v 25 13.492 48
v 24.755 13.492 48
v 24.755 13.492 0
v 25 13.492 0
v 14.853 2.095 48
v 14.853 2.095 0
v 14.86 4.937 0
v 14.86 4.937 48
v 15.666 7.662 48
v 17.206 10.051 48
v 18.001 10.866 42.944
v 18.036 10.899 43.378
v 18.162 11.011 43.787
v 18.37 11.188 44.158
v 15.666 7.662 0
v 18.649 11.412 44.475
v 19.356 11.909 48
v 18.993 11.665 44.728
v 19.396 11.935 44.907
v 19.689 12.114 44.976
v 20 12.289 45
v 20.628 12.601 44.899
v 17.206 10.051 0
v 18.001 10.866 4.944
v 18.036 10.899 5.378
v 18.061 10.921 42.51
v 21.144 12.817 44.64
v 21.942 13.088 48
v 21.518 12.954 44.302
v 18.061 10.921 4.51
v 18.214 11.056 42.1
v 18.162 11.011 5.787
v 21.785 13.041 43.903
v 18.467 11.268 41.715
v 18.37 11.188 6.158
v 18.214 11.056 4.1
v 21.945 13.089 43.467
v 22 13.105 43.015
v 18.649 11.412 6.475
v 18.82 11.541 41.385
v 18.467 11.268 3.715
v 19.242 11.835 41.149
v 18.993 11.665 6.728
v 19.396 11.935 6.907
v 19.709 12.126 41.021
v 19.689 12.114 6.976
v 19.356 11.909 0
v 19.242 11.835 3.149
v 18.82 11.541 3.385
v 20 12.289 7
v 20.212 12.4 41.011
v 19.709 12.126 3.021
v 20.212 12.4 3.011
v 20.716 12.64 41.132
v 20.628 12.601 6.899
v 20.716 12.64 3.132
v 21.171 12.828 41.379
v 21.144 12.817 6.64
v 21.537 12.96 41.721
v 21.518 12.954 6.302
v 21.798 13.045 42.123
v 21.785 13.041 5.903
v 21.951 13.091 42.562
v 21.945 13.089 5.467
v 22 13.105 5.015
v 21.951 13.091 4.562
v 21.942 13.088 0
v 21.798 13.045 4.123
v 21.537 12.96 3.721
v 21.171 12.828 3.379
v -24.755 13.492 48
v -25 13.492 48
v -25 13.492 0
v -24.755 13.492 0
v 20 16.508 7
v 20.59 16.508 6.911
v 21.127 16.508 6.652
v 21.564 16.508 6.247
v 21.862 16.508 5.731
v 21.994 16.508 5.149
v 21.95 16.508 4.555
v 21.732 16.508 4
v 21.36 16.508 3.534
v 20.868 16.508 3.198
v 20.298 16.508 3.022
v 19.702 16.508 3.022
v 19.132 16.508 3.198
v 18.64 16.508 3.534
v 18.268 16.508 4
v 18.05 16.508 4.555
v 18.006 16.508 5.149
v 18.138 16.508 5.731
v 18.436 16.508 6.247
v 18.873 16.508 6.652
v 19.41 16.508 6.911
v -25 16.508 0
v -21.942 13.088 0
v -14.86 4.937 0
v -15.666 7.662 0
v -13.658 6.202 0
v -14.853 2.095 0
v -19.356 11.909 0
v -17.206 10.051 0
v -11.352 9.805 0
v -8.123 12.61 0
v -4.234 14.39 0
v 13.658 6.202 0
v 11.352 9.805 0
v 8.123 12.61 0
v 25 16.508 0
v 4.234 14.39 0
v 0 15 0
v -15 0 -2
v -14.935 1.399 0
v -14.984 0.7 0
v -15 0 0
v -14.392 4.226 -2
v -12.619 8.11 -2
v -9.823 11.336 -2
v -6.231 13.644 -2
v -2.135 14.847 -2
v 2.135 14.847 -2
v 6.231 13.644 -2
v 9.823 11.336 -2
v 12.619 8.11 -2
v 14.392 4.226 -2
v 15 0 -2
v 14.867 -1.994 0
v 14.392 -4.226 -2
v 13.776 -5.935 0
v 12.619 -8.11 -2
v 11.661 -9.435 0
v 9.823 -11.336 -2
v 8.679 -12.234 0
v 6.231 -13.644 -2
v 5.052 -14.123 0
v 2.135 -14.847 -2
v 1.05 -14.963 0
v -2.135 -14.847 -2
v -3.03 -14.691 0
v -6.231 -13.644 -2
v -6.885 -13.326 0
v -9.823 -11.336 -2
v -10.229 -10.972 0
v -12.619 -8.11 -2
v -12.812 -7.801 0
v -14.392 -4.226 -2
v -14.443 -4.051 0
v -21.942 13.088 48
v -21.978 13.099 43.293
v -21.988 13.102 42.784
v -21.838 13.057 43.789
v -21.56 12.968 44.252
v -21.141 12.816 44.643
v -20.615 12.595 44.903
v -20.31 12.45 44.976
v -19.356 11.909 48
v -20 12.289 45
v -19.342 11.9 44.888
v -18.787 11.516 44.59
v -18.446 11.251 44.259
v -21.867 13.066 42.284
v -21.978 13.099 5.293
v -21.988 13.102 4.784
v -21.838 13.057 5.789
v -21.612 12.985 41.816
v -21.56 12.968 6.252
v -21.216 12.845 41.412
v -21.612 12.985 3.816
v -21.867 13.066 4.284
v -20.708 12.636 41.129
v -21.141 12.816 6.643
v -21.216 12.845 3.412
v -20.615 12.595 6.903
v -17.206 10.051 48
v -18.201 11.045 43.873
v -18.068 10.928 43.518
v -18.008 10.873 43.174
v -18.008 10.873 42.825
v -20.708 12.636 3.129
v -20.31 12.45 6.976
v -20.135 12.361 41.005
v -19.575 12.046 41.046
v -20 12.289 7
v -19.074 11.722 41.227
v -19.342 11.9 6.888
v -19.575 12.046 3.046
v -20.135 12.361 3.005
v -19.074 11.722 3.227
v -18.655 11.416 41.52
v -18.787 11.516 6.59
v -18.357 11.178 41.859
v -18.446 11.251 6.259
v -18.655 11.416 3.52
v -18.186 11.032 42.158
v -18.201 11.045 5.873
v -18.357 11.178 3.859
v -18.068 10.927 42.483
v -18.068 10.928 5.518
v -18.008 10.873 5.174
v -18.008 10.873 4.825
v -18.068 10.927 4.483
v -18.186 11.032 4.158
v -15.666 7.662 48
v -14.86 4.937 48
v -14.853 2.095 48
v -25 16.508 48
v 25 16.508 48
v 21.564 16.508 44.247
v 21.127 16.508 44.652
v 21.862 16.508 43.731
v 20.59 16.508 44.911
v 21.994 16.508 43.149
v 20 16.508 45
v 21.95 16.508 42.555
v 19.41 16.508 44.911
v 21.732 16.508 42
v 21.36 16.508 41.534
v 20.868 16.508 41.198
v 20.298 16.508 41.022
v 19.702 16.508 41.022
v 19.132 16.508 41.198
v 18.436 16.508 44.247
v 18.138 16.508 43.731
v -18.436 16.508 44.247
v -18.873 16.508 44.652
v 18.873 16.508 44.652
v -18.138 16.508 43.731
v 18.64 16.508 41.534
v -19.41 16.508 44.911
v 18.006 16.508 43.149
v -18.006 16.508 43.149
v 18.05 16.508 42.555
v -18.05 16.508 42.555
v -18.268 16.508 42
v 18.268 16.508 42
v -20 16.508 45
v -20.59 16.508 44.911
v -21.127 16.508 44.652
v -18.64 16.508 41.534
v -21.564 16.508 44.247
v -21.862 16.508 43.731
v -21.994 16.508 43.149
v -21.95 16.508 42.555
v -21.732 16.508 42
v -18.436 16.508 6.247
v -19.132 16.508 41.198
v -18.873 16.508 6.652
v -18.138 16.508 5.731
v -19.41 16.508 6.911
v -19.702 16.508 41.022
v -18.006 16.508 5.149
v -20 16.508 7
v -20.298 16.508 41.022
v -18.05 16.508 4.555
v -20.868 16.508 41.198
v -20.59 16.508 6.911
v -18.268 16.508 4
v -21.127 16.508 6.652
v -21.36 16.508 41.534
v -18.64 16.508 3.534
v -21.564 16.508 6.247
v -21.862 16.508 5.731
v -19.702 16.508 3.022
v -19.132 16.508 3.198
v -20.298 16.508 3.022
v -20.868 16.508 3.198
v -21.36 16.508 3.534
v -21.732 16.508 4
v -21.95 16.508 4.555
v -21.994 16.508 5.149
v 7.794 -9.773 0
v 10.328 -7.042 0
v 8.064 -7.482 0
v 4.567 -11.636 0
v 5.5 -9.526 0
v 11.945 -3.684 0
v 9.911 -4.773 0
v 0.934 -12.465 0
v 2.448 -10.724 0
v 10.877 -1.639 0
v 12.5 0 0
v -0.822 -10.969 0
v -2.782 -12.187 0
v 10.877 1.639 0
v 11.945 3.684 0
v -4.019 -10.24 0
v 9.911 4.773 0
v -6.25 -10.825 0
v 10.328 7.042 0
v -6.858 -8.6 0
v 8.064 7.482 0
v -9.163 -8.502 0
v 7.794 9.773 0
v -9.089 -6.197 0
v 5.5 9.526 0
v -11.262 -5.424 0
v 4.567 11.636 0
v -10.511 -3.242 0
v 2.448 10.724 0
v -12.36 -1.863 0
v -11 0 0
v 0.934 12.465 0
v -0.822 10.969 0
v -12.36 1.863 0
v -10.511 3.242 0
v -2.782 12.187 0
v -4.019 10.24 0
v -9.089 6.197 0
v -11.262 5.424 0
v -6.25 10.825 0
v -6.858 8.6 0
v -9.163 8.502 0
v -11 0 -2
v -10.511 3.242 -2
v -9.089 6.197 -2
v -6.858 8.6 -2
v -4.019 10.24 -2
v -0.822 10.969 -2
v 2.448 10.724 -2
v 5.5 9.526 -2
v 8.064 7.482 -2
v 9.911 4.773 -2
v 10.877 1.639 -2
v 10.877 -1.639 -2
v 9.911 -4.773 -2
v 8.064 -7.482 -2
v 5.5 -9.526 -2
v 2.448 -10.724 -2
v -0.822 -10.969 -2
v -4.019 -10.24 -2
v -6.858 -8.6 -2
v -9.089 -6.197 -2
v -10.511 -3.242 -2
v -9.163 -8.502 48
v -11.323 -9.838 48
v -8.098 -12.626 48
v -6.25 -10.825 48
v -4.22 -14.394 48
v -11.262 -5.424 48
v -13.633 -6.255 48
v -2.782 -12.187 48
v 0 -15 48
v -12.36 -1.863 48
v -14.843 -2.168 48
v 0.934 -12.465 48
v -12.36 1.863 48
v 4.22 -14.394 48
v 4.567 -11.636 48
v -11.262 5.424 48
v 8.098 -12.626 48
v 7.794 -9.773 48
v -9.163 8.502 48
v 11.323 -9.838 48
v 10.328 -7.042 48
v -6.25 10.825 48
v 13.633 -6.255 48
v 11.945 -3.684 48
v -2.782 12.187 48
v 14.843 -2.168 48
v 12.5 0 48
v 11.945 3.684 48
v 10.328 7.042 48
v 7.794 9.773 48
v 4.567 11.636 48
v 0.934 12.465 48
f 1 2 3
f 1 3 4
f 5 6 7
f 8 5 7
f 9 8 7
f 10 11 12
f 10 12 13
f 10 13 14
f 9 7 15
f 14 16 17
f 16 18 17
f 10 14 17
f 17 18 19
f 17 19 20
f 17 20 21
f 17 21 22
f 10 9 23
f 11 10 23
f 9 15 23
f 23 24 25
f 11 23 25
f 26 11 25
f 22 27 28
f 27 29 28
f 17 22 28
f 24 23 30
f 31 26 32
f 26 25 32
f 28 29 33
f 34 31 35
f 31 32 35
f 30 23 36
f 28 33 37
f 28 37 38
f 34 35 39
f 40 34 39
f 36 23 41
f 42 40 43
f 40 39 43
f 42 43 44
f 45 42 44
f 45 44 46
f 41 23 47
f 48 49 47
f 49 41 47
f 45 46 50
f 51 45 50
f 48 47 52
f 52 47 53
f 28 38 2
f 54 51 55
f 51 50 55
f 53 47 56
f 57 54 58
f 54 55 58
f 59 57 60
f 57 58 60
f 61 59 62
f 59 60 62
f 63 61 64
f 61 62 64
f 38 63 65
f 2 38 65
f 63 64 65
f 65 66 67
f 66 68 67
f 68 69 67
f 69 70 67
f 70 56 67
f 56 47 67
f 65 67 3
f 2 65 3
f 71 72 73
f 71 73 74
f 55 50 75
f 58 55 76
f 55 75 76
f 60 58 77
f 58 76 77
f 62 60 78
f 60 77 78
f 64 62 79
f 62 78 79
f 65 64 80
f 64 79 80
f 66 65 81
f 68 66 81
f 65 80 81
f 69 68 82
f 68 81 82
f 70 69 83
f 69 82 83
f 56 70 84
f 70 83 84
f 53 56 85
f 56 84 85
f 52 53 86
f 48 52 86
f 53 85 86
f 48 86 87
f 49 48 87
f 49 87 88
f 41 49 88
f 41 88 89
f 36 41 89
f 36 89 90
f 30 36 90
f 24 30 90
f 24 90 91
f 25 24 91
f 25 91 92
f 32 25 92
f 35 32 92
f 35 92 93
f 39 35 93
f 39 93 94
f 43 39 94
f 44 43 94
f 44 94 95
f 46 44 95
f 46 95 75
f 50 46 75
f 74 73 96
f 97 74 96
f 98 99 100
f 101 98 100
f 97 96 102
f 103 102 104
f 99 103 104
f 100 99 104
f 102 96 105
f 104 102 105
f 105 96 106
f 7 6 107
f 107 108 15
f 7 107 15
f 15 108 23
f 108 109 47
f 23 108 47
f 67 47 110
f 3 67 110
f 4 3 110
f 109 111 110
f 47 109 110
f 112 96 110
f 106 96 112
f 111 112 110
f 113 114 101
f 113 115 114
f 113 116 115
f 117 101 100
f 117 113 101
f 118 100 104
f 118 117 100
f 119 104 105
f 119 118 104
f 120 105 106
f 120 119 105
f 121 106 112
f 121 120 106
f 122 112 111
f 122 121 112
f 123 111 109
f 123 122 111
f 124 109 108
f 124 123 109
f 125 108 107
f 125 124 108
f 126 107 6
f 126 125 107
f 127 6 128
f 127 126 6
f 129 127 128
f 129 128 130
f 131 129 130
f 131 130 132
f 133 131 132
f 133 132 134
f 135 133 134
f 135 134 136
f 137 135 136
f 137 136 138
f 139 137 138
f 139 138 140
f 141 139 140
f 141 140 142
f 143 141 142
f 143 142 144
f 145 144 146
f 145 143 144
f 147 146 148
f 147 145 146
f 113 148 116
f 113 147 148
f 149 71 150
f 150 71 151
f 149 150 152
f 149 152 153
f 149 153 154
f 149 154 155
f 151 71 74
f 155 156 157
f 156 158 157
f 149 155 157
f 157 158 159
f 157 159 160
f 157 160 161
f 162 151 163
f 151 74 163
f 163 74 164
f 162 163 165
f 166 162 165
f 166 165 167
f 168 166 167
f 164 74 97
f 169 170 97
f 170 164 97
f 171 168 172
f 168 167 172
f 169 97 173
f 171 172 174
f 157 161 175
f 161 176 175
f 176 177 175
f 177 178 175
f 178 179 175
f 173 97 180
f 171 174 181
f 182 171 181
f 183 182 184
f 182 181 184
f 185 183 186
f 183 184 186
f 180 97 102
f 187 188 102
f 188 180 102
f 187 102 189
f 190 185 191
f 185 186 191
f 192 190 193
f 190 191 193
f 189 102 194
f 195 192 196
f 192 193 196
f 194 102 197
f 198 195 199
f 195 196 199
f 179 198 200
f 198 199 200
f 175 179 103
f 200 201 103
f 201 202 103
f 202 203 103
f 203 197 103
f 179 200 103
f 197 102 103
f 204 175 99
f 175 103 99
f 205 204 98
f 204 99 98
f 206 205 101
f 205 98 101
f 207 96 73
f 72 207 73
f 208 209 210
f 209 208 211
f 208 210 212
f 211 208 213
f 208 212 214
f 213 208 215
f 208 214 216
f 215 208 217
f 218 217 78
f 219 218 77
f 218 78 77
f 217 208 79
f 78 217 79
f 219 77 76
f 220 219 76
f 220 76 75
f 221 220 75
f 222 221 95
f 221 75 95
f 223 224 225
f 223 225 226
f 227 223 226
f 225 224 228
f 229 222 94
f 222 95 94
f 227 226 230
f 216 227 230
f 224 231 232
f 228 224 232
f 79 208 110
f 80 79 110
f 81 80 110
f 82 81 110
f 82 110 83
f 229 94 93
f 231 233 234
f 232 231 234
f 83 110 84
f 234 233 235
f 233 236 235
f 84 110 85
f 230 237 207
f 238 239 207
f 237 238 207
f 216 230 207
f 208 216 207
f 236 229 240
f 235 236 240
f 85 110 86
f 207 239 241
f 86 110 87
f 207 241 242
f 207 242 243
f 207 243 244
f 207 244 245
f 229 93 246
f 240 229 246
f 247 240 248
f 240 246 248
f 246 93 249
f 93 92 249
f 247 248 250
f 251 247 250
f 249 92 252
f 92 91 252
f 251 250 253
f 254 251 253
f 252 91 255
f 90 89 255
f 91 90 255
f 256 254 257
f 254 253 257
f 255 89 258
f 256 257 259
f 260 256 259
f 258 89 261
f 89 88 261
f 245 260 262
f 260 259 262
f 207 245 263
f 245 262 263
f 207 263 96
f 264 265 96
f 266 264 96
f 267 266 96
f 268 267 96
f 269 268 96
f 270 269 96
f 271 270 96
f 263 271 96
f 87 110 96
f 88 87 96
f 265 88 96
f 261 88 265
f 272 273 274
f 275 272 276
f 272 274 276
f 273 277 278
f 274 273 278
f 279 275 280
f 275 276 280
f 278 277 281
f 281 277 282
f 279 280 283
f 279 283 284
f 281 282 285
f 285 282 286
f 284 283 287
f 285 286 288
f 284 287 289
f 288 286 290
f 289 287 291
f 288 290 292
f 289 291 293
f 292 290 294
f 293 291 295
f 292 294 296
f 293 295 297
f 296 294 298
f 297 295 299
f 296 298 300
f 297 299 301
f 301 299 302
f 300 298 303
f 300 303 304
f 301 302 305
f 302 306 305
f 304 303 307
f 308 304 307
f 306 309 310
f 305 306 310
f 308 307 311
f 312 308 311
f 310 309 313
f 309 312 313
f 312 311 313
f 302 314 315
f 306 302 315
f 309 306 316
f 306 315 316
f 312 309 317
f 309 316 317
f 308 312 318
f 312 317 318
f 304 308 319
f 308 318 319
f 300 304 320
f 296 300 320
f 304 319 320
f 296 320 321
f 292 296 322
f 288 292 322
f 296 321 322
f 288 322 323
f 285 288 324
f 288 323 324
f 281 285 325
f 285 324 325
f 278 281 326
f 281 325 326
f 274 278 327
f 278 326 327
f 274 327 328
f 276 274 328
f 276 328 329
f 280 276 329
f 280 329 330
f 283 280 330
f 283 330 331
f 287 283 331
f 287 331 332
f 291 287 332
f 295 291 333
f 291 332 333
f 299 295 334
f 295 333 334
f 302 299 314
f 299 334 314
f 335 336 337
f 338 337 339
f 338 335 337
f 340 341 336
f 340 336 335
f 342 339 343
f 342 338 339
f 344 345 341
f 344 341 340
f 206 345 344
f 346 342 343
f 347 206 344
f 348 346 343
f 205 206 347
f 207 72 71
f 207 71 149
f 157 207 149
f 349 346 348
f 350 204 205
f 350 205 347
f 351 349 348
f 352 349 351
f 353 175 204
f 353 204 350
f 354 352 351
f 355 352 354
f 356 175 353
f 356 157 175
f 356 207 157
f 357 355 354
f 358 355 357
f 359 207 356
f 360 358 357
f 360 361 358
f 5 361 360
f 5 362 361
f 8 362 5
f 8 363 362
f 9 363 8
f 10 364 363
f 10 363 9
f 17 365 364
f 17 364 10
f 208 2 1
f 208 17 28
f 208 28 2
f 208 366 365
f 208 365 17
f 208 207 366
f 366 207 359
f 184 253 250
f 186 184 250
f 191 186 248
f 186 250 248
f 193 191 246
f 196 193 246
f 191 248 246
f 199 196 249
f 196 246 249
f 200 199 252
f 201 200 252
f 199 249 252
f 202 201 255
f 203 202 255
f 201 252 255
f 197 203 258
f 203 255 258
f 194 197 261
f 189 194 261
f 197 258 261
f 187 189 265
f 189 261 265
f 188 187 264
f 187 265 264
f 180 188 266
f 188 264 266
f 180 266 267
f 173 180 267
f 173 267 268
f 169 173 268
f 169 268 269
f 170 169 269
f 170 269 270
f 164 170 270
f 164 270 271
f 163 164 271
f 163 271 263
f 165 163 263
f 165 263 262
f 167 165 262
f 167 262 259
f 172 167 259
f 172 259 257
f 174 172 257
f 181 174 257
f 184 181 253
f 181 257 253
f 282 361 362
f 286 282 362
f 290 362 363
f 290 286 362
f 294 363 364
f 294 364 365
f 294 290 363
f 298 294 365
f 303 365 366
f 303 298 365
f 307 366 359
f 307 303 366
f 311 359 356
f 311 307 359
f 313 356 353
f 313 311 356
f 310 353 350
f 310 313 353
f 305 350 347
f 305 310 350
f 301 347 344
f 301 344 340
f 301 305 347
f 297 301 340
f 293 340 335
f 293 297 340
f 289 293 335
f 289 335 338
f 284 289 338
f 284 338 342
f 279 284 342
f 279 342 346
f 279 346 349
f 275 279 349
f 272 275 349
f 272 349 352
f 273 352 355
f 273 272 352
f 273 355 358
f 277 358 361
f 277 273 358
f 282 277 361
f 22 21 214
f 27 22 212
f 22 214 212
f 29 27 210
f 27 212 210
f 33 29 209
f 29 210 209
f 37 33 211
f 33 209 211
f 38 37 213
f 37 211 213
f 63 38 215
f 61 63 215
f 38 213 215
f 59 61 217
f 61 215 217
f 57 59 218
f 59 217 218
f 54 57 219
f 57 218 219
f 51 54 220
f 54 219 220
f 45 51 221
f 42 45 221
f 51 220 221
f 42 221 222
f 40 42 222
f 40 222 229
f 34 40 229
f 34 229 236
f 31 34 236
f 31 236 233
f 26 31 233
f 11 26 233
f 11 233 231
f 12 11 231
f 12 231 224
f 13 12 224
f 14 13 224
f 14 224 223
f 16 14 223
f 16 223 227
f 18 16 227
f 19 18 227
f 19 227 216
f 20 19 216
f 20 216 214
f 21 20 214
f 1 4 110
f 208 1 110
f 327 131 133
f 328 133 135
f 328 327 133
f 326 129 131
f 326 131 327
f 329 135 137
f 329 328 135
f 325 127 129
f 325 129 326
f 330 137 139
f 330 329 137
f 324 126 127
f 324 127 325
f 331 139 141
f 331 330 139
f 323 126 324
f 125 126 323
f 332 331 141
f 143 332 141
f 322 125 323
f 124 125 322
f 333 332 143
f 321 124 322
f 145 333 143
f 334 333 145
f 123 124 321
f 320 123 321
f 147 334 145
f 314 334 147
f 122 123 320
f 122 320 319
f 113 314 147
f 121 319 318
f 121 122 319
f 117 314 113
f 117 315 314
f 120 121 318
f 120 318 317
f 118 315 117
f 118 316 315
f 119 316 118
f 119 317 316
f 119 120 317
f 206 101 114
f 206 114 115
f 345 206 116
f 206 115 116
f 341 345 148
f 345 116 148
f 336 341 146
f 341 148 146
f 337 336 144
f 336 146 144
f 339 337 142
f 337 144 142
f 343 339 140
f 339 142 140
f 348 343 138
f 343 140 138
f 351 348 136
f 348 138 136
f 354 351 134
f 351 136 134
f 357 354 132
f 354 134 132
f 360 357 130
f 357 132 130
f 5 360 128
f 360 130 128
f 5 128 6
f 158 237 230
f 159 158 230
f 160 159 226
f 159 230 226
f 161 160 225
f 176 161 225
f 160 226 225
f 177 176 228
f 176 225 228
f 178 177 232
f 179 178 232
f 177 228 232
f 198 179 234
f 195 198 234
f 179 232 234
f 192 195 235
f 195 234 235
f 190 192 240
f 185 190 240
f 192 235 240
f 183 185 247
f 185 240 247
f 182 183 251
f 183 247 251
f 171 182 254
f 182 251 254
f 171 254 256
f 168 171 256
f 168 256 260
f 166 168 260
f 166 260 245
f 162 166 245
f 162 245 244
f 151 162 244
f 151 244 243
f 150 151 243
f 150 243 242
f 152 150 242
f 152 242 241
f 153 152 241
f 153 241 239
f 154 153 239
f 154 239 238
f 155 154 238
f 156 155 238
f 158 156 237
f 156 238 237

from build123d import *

# Parameters (mm, degrees)
SKETCH1_R           = 12.5
BOSS_EXTRUDE1_DEPTH = 48
BOSS_EXTRUDE3_START = 2
SKETCH3_R           = 15
SKETCH3_R_2         = 11
BOSS_EXTRUDE3_DEPTH = 2
SKETCH4_R           = 2
CUT_EXTRUDE1_DEPTH  = 63.623877738


with BuildPart() as part:
    # Sketch1 → Boss-Extrude1 (new body)
    with BuildSketch(Plane.XY):
        with BuildLine():
            Line((24.754908454, 13.492063492), (25, 13.492063492))
            Line((25, 13.492063492), (25, 16.507936508))
            Line((25, 16.507936508), (-25, 16.507936508))
            Line((-25, 16.507936508), (-25, 13.492063492))
            Line((-25, 13.492063492), (-24.754908454, 13.492063492))
            ThreePointArc((-24.754908454, 13.492063492), (-17.206125308, 10.050712211), (-14.852945072, 2.095238095))
            ThreePointArc((-14.852945072, 2.095238095), (0, -15), (14.852945072, 2.095238095))
            ThreePointArc((14.852945072, 2.095238095), (17.206125308, 10.050712211), (24.754908454, 13.492063492))
        make_face()
        Circle(SKETCH1_R, mode=Mode.SUBTRACT)
    extrude(amount=BOSS_EXTRUDE1_DEPTH)

    # Sketch3 → Boss-Extrude3 (add)
    with BuildSketch(Plane(origin=(0, 0, 0), x_dir=(-1, 0, 0), z_dir=(0, 0, -1)).offset(BOSS_EXTRUDE3_START)):
        Circle(SKETCH3_R)
        Circle(SKETCH3_R_2, mode=Mode.SUBTRACT)
    extrude(amount=-BOSS_EXTRUDE3_DEPTH)

    # Sketch4 → Cut-Extrude1 (cut, through all)
    with BuildSketch(Plane(origin=(0, 16.507936508, 0), x_dir=(1, 0, 0), z_dir=(0, 1, 0))):
        with Locations(Location((-20, -5, 0), (0, 0, 270))):
            Circle(SKETCH4_R)
        with Locations(Location((20, -5, 0), (0, 0, 270))):
            Circle(SKETCH4_R)
        with Locations(Location((20, -43, 0), (0, 0, 270))):
            Circle(SKETCH4_R)
        with Locations(Location((-20, -43, 0), (0, 0, 270))):
            Circle(SKETCH4_R)
    extrude(amount=-CUT_EXTRUDE1_DEPTH, mode=Mode.SUBTRACT)


solid = part.part
